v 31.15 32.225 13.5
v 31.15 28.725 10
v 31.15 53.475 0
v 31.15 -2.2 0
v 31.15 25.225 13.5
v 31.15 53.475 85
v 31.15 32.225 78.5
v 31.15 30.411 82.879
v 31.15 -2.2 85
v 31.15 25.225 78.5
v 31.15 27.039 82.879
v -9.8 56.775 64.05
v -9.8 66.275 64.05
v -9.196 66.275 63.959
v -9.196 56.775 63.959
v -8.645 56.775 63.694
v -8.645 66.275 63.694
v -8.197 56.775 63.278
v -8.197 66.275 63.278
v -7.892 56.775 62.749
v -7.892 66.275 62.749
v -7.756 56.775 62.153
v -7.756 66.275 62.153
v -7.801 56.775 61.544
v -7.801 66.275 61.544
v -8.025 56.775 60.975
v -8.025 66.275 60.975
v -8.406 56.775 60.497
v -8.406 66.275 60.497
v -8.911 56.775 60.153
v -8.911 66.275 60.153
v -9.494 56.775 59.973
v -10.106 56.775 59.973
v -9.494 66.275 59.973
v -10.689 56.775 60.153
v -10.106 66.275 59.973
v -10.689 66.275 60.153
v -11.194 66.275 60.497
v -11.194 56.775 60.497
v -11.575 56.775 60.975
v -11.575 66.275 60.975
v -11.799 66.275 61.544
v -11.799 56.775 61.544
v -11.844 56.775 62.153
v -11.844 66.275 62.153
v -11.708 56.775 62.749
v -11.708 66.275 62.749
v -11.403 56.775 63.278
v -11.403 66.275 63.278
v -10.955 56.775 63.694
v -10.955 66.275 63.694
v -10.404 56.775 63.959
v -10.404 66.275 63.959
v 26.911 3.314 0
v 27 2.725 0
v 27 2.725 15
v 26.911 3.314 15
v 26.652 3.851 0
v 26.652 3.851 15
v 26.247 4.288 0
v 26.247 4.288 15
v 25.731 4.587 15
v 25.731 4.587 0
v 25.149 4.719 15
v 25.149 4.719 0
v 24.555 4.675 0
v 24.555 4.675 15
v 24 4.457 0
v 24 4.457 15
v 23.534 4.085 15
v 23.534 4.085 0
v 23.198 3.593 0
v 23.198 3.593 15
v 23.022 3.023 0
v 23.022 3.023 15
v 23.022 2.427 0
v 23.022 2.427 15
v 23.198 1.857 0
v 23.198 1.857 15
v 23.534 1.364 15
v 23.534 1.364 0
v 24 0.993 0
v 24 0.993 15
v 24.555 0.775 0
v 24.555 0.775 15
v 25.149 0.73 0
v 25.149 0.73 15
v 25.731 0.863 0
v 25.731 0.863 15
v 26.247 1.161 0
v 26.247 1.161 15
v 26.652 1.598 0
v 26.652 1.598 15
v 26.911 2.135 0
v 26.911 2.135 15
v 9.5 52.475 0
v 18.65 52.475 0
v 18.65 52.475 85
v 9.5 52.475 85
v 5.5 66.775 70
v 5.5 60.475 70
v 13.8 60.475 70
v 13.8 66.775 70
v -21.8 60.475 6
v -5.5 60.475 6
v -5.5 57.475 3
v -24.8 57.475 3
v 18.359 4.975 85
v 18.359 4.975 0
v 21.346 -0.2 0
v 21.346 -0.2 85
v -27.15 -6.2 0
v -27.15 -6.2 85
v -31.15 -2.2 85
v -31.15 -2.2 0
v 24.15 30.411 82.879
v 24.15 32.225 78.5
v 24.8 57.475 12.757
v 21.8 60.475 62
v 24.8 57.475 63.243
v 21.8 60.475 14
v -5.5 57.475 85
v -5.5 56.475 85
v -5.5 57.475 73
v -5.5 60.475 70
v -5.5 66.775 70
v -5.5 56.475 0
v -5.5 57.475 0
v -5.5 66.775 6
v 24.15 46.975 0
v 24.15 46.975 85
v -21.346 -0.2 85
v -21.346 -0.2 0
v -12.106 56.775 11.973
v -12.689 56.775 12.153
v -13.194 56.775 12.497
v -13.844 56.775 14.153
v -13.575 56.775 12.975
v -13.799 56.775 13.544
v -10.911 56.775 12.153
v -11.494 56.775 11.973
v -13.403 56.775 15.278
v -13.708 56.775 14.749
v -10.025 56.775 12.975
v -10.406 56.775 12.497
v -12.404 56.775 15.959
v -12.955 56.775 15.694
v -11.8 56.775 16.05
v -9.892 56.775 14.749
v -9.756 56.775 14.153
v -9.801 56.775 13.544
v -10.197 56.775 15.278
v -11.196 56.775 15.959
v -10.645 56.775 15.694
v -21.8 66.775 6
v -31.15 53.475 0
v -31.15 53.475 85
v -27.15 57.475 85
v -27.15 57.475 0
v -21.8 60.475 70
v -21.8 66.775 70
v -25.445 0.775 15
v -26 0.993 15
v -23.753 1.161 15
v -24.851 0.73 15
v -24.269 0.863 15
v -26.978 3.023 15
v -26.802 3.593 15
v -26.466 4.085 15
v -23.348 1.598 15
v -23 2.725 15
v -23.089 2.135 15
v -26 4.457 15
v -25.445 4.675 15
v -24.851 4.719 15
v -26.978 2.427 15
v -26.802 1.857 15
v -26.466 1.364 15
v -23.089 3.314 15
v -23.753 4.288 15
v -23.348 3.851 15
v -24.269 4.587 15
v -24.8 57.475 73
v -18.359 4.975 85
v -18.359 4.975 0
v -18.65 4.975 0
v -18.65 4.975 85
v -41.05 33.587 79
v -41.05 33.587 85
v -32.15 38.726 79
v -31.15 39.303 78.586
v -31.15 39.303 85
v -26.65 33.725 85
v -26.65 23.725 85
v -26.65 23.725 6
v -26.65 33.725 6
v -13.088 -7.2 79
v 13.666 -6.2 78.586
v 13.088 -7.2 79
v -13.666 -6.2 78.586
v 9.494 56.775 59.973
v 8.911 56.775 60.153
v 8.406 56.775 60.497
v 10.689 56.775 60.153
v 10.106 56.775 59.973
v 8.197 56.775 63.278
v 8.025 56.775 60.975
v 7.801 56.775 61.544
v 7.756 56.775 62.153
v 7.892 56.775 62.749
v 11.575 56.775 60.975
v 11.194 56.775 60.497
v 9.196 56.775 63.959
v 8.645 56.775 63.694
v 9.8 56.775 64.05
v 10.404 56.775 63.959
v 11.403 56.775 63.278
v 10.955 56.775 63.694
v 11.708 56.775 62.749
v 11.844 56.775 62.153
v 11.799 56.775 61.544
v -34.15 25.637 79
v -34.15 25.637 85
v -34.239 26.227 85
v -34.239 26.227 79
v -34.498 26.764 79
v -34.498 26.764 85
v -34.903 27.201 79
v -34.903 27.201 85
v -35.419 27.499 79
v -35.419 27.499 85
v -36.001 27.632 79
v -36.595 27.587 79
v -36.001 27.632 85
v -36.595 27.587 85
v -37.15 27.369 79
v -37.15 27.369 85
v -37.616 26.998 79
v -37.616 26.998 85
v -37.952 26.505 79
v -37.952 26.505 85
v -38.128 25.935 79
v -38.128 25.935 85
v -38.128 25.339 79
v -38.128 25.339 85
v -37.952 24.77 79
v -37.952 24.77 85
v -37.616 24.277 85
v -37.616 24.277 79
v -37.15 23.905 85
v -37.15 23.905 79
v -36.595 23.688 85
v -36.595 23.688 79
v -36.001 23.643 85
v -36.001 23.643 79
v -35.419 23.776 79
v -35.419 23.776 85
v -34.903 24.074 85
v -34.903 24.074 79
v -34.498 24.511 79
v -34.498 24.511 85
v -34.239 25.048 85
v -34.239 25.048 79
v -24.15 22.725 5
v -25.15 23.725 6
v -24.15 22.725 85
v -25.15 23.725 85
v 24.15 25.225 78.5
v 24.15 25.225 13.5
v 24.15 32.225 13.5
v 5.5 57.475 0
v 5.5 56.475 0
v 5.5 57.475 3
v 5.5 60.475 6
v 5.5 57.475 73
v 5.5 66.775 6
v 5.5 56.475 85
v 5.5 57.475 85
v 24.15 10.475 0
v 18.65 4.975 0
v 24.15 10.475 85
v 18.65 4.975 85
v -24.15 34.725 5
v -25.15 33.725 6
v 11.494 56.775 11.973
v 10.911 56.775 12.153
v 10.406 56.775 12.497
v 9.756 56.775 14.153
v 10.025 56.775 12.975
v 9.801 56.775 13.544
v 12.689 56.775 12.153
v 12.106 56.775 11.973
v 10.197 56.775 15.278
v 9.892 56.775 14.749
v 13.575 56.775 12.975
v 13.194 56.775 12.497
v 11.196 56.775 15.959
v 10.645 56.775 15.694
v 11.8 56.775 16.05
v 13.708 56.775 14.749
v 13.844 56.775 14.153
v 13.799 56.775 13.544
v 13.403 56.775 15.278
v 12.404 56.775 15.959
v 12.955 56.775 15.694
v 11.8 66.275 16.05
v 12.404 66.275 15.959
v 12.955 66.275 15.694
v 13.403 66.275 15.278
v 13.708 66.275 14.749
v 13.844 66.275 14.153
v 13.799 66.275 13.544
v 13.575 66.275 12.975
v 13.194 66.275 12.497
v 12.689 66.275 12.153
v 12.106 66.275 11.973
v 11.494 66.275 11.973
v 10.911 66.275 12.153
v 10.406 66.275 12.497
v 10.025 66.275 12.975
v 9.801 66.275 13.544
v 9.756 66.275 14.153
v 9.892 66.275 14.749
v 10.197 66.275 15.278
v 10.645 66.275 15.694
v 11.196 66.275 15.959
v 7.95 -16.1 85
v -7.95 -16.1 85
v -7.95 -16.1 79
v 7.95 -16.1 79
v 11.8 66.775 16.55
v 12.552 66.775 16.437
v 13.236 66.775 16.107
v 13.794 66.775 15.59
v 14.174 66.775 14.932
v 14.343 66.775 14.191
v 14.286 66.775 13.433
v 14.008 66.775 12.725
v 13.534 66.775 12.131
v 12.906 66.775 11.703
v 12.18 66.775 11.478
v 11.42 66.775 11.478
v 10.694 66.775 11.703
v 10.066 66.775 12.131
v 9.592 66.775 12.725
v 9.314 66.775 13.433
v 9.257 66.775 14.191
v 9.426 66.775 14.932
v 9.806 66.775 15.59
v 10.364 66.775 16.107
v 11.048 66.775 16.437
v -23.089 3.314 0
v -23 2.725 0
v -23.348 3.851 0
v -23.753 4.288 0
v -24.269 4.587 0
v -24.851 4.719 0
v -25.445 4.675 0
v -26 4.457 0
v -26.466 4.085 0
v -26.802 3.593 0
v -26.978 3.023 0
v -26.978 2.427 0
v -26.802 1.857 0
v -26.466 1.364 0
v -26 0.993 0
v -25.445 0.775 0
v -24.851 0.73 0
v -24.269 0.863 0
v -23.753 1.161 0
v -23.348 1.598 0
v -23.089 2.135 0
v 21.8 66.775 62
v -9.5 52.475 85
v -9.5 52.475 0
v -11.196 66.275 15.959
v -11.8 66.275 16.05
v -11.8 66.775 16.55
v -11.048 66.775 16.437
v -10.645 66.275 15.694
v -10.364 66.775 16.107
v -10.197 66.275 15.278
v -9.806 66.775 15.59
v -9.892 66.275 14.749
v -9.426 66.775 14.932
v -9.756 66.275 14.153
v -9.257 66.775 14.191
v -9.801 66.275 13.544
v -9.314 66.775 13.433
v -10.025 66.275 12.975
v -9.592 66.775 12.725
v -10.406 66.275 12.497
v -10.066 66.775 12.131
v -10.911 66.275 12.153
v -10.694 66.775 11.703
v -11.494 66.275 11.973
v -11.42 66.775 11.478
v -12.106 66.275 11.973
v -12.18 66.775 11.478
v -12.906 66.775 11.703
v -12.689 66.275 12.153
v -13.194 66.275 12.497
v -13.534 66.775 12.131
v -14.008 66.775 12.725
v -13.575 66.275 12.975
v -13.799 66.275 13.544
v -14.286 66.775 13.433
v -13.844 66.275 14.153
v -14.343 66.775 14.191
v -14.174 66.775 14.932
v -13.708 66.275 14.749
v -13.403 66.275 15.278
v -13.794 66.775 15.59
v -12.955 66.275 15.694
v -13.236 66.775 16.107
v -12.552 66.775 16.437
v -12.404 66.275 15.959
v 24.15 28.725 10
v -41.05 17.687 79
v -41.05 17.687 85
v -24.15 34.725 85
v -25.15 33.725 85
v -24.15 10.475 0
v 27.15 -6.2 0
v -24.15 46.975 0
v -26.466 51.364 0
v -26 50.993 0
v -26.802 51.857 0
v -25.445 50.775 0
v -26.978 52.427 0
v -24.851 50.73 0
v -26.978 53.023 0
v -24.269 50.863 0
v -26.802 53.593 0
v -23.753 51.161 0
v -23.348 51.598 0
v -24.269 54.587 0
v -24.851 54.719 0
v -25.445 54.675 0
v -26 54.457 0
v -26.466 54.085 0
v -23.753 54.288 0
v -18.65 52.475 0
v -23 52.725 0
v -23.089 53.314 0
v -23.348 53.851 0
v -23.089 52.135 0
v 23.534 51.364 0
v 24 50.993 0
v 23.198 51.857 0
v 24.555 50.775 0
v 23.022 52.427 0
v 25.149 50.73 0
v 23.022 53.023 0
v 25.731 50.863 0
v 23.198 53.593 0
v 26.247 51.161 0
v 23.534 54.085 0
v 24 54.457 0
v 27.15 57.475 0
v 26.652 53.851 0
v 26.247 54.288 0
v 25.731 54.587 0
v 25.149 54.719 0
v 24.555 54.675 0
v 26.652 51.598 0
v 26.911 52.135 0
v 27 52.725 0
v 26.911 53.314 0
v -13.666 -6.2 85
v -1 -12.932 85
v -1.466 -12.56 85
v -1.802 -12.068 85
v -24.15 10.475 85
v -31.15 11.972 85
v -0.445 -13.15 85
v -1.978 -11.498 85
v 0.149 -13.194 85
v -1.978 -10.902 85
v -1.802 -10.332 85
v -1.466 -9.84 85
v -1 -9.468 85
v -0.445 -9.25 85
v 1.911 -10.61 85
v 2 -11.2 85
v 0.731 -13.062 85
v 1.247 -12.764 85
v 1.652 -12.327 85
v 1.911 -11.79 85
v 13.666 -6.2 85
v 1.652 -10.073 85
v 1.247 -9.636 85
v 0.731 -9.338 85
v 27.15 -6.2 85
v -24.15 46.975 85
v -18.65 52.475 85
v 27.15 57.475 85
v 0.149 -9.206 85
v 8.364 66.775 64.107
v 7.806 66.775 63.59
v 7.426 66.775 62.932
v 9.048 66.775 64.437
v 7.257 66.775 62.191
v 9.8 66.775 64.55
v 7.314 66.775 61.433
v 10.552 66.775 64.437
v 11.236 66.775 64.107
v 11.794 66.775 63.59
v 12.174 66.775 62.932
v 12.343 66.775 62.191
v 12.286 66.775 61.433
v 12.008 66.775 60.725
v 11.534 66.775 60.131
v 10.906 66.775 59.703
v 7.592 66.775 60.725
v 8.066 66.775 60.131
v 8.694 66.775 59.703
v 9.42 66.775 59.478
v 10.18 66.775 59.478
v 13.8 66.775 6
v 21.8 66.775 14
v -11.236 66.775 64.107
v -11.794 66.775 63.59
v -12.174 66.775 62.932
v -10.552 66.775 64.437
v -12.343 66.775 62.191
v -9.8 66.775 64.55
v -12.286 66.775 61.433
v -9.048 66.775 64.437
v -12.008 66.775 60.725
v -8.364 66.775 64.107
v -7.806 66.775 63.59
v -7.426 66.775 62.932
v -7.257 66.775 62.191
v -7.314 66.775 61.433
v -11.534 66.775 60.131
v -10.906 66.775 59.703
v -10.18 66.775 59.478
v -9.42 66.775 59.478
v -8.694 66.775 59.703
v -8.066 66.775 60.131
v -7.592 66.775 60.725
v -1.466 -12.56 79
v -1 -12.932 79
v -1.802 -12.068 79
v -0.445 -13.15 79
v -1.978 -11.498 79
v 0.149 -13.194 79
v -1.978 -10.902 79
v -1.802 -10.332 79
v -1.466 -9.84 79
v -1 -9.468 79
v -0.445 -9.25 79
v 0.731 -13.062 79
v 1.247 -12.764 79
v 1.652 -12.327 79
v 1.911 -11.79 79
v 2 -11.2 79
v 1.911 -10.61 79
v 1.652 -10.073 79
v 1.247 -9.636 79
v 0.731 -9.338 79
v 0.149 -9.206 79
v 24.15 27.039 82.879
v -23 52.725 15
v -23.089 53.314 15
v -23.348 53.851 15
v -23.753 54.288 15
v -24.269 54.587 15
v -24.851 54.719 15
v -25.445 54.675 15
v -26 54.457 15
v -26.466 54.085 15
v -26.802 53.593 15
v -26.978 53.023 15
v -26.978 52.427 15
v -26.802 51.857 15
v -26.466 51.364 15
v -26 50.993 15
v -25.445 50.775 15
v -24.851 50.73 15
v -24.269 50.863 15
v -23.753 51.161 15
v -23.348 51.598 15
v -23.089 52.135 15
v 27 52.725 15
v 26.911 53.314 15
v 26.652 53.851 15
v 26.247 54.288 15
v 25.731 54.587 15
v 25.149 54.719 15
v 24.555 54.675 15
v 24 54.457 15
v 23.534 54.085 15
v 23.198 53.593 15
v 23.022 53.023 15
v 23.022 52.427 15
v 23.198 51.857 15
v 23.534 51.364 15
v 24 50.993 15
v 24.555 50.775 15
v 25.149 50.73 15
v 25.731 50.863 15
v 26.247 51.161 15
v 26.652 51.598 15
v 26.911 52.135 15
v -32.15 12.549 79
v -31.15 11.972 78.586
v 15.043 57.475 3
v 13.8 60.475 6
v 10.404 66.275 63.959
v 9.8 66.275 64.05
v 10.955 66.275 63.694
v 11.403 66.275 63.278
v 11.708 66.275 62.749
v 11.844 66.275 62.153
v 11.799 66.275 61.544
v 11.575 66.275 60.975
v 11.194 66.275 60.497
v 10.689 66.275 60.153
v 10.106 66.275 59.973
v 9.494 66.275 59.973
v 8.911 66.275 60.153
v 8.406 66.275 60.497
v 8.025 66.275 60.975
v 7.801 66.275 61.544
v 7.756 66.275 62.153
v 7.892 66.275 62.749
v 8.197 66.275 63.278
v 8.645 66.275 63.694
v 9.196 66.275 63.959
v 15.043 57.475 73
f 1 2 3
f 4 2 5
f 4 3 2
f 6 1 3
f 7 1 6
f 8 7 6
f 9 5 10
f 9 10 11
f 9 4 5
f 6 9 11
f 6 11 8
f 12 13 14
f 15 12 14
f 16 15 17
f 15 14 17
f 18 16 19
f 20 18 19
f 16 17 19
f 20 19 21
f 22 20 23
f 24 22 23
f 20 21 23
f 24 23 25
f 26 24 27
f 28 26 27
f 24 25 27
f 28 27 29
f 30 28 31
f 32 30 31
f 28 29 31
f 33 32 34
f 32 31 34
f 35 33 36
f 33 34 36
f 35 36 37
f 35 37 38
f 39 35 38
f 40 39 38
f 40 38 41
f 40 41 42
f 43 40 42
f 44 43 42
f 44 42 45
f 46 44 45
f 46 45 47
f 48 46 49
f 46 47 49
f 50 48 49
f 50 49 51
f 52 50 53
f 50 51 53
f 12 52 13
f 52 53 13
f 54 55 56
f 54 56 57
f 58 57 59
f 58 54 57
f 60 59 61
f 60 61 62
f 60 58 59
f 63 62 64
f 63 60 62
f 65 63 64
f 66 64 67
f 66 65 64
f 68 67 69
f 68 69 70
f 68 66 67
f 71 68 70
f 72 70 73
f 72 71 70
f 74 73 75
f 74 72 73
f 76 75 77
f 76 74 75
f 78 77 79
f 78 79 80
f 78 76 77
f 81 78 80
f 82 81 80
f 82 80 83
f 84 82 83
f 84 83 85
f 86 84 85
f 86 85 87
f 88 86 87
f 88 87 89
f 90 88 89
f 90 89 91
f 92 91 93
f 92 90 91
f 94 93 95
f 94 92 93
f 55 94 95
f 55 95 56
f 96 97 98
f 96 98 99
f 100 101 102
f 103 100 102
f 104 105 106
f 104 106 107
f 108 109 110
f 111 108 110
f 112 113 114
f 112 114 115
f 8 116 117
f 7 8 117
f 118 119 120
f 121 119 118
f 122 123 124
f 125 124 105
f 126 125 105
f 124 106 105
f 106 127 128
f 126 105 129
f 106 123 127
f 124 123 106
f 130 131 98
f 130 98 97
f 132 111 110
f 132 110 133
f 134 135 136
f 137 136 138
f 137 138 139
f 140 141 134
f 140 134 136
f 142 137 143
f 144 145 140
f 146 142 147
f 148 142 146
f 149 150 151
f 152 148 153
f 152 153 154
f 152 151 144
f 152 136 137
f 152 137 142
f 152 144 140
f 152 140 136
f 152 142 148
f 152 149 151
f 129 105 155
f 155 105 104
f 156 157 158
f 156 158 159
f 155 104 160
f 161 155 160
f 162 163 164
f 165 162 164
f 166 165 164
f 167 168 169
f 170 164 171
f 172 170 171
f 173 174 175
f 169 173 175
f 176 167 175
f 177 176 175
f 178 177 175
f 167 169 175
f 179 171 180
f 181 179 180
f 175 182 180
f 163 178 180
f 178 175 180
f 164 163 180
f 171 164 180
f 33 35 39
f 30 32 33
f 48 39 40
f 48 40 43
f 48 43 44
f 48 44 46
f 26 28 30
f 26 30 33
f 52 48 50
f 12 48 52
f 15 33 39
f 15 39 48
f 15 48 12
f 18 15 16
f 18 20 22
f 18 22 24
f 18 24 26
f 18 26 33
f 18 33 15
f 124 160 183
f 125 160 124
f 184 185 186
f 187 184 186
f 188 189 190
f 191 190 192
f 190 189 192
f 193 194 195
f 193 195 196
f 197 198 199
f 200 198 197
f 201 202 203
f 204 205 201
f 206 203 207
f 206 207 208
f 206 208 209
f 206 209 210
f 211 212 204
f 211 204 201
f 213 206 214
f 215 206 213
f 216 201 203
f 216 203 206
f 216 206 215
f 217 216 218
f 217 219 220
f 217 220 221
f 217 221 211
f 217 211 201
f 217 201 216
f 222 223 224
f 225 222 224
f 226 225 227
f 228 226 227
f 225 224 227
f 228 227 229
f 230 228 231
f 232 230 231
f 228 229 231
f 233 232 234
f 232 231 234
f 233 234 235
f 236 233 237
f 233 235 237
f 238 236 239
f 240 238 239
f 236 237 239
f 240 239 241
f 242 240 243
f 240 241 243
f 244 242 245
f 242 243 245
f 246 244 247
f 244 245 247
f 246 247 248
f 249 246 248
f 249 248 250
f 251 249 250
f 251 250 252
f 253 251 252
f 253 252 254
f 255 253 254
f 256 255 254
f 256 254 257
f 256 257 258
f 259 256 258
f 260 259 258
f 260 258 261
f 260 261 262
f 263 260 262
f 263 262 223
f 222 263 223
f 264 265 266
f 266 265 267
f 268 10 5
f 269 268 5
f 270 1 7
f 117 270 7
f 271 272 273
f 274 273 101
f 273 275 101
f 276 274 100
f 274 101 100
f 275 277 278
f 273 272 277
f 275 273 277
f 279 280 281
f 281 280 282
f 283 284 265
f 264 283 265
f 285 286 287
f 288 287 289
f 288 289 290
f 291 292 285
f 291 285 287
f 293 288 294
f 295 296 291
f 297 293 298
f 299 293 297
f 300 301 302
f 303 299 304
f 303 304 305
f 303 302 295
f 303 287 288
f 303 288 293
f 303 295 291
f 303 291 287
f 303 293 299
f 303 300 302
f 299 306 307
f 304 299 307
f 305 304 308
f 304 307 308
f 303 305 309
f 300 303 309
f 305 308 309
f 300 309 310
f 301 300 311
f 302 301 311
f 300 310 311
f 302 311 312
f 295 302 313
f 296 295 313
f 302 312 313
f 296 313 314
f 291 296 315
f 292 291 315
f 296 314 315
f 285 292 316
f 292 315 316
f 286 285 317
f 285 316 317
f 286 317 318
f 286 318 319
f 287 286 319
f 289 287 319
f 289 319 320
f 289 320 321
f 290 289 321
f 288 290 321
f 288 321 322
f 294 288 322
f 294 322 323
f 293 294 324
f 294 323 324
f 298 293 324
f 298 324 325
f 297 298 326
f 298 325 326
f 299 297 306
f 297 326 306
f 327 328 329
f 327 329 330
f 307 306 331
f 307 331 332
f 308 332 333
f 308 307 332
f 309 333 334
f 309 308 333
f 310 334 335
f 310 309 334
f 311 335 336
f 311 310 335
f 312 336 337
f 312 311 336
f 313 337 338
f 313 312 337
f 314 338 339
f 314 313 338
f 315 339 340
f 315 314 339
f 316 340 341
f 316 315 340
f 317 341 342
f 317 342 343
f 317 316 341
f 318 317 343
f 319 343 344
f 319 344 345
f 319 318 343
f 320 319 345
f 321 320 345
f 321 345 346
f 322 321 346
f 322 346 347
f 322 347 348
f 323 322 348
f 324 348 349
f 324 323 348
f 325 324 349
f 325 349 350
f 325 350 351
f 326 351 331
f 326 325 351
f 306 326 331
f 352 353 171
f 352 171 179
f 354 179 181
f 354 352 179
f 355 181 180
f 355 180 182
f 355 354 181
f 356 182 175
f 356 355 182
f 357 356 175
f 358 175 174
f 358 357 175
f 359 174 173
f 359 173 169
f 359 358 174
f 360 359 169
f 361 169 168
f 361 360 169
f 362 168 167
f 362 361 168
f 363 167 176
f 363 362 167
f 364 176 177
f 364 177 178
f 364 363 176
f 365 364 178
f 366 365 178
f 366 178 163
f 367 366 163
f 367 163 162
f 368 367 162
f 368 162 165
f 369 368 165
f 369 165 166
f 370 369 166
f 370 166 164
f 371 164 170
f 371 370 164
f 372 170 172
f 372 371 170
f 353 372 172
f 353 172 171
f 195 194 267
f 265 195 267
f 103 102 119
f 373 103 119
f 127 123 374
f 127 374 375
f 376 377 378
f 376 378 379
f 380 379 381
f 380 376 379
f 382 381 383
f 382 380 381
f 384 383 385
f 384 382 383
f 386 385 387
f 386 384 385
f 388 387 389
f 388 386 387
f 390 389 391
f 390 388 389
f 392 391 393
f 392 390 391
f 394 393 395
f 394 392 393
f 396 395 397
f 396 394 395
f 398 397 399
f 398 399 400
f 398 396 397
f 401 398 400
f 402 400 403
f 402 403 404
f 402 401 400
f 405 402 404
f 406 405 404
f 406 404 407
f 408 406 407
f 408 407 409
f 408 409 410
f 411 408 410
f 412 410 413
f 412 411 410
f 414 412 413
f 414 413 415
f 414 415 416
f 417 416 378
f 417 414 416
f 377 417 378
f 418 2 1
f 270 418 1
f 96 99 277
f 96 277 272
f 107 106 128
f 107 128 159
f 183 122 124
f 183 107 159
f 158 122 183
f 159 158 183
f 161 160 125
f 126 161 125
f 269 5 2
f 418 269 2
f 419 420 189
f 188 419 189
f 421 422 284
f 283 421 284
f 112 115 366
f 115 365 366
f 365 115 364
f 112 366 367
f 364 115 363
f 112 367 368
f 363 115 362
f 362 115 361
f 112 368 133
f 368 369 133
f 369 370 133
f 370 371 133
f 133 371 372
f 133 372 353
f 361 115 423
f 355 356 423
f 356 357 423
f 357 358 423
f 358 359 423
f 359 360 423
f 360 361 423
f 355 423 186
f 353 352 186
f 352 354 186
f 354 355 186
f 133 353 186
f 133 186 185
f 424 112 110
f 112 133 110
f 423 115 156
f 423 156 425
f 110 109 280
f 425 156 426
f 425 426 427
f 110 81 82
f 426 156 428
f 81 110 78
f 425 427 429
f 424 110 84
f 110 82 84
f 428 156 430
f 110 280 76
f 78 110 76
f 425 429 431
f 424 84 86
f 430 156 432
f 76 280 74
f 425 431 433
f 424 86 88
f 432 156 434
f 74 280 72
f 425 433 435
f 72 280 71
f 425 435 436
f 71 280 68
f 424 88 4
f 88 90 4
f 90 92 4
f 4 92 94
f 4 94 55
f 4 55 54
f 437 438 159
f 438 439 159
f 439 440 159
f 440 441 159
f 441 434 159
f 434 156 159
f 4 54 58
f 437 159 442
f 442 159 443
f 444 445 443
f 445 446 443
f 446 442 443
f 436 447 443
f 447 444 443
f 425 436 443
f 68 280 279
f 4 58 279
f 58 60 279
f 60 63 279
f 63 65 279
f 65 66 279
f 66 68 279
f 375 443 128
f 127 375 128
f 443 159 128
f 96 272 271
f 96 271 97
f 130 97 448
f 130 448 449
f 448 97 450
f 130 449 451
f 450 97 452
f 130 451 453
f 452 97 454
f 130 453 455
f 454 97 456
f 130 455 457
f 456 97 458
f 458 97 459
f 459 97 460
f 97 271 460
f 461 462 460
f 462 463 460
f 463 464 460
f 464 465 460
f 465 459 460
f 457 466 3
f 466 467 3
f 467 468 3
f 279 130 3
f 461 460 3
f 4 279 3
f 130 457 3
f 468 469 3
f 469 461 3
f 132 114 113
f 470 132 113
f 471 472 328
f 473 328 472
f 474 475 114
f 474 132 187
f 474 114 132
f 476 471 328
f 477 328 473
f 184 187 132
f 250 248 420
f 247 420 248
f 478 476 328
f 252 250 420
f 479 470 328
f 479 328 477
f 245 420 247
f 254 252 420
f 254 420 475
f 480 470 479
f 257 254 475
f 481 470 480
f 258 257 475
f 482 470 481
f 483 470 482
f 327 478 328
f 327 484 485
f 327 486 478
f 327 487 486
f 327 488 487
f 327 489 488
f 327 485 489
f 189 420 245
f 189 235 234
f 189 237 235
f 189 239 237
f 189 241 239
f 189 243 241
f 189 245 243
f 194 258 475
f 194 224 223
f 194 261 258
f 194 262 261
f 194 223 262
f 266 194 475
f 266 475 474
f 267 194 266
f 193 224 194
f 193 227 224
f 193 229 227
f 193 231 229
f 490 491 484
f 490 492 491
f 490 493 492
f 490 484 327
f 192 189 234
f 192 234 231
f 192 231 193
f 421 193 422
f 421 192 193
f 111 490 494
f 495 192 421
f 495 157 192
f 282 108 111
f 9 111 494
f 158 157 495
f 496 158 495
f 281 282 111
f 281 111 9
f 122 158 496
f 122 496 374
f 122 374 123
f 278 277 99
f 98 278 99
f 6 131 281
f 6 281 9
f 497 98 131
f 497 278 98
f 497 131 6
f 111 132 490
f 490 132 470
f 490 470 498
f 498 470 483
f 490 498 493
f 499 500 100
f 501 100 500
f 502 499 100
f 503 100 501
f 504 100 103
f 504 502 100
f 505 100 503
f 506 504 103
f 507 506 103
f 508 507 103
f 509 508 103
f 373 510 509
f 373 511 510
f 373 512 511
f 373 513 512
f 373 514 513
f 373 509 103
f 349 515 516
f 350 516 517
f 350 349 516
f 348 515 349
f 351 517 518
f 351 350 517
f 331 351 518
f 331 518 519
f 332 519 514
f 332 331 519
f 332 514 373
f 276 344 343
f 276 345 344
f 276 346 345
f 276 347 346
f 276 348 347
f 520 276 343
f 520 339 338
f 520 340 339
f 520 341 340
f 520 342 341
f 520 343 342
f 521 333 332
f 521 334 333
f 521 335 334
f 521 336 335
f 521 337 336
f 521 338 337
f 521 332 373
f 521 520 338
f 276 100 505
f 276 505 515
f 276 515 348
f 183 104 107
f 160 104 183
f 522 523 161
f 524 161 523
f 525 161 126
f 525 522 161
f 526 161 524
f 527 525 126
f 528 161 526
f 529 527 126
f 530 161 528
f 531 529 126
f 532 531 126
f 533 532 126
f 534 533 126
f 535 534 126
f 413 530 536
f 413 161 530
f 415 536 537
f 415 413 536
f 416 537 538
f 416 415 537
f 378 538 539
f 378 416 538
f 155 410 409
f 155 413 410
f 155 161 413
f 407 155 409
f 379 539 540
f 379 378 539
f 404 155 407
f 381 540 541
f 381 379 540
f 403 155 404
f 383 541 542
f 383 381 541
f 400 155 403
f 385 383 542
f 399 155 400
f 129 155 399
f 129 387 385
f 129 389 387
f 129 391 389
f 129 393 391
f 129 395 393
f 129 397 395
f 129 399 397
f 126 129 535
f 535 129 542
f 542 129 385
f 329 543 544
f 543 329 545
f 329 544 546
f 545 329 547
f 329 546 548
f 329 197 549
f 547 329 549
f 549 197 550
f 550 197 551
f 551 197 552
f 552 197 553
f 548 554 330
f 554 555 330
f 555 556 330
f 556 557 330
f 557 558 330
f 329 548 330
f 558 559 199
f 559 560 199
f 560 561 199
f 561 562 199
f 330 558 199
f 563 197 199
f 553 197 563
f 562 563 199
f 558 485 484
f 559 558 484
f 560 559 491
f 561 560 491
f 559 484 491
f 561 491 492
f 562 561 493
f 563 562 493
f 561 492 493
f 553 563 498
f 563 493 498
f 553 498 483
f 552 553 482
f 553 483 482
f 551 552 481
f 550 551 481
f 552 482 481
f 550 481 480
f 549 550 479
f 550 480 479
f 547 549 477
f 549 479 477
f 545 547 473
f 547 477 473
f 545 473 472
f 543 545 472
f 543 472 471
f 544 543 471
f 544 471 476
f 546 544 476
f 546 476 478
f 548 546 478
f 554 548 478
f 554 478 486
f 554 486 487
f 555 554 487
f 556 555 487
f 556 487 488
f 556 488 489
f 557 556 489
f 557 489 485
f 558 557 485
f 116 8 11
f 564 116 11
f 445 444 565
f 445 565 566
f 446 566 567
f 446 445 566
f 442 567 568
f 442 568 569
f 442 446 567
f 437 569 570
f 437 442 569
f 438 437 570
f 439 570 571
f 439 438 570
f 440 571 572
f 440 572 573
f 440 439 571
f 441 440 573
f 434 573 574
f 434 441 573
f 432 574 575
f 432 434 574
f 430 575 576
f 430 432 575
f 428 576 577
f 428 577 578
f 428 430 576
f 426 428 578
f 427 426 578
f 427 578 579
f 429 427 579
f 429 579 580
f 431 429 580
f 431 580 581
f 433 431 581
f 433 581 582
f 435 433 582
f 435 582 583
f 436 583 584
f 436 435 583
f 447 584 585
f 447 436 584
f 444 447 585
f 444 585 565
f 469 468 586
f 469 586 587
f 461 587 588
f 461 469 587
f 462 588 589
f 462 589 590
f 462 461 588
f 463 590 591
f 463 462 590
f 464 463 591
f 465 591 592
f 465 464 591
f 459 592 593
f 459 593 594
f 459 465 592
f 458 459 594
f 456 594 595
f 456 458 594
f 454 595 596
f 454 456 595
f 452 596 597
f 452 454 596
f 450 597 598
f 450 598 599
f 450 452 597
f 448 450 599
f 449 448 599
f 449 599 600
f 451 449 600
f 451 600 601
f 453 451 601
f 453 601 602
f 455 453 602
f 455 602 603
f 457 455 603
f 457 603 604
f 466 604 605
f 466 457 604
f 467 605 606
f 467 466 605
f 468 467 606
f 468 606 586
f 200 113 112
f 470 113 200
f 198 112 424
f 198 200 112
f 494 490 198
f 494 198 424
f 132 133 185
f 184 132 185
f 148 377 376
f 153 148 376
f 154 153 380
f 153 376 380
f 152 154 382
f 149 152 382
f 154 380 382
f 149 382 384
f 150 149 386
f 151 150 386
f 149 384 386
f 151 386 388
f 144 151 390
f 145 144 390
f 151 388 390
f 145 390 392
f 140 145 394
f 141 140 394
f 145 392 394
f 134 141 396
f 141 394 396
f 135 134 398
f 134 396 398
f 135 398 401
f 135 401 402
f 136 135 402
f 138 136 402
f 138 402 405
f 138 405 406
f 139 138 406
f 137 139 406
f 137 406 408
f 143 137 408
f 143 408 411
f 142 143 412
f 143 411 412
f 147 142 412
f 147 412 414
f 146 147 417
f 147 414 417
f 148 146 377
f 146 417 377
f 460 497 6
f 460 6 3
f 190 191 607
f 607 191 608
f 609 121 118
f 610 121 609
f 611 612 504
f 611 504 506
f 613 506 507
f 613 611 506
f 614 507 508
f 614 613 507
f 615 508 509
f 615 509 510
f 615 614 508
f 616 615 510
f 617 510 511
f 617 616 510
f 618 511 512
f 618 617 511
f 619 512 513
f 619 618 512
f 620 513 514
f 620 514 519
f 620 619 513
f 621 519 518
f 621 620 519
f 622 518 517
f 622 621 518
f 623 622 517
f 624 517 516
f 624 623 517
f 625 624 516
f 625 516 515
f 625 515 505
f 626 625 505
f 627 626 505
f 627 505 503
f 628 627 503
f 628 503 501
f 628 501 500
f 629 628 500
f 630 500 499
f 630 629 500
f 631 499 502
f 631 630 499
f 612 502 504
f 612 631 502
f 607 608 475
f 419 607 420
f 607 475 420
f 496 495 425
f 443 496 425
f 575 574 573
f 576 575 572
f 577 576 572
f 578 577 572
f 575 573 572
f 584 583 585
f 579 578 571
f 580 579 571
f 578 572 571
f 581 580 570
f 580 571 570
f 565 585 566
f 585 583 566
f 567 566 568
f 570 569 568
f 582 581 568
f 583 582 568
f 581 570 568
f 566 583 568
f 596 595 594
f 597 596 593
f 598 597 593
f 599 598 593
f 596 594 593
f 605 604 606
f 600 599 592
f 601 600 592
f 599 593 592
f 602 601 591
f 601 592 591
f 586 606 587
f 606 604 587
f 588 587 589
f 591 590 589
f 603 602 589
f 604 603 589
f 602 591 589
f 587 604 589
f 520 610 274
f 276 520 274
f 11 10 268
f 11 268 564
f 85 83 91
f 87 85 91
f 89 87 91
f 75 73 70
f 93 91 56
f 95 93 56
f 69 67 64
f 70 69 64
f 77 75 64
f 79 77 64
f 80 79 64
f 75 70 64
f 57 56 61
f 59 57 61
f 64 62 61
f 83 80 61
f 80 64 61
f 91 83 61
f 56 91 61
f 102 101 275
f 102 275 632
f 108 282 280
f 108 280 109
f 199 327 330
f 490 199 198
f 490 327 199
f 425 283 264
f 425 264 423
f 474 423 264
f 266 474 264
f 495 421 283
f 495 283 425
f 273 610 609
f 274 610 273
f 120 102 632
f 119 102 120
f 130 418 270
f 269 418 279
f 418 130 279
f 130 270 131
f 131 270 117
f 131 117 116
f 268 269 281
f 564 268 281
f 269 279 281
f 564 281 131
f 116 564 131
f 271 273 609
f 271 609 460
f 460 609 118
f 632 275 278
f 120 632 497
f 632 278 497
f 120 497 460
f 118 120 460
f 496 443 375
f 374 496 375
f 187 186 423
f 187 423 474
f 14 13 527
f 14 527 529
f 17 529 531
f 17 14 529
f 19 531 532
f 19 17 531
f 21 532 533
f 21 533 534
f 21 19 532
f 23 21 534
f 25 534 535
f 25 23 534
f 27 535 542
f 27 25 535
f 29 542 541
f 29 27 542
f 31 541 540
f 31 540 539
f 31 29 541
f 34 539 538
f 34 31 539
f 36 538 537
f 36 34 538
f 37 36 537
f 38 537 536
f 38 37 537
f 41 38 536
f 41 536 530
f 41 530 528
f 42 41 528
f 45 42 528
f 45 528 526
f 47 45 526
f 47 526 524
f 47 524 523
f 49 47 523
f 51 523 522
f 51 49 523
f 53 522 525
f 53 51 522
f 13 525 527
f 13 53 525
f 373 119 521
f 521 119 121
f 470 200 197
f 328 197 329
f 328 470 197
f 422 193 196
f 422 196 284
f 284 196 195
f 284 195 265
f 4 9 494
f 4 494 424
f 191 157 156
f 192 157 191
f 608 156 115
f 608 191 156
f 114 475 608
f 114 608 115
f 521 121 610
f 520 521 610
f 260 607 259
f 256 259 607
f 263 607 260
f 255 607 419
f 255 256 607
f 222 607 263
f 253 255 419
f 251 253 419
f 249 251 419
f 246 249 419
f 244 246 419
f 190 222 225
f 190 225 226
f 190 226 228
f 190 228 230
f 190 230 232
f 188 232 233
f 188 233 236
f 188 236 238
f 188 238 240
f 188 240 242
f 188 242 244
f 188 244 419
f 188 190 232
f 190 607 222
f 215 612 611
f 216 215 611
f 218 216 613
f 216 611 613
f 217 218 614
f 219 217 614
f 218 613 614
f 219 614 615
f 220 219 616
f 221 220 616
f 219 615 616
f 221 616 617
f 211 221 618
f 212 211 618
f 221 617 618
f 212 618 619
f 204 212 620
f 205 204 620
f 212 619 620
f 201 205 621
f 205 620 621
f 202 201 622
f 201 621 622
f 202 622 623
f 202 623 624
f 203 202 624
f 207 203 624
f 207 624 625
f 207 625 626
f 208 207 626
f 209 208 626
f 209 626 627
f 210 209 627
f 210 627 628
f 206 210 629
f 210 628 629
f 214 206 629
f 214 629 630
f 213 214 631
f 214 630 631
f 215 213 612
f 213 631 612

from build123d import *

# Parameters (mm, degrees)
BOSS_EXTRUDE1_DEPTH     = 100
BOSS_EXTRUDE2_DEPTH     = 100
CUT_EXTRUDE1_DEPTH      = 10
CHAMFER1_SIZE           = 5.5
CHAMFER2_SIZE           = 4
SKETCH8_R               = 2
BOSS_EXTRUDE3_DEPTH     = 9.3
CUT_EXTRUDE3_DEPTH      = 125.214315536
CUT_EXTRUDE3_DEPTH_BACK = 10
SKETCH9_W               = 11
SKETCH9_H               = 9.3
CHAMFER3_SIZE           = 4
CHAMFER4_SIZE           = 3
CHAMFER5_SIZE           = 3
SKETCH10_W              = 5
SKETCH10_H              = 10
CUT_EXTRUDE4_DEPTH      = 94
CHAMFER7_SIZE           = 1
CHAMFER8_SIZE           = 1
SKETCH11_R              = 2.05
CUT_EXTRUDE5_DEPTH      = 10
CHAMFER9_SIZE           = 0.5
SKETCH12_R              = 2
CUT_EXTRUDE6_DEPTH      = 15
SKETCH20_W              = 62.3
SKETCH20_H              = 63.674798271
CUT_EXTRUDE14_DEPTH     = 15
BOSS_EXTRUDE4_DEPTH     = 6
SKETCH22_R              = 2
CUT_EXTRUDE15_DEPTH     = 10
CHAMFER10_SIZE          = 1
CHAMFER10_SIZE2         = 0.414213562
CHAMFER11_SIZE          = 1
CHAMFER11_SIZE2         = 0.414213562


with BuildPart() as part:
    # Sketch4 → Boss-Extrude1 (new body)
    with BuildSketch(Plane.XY):
        Polygon((-18.358738987, 4.974798271), (-27, 4.974798271), (-27, -6.2), (27, -6.2), (27, 4.974798271), (18.358738987, 4.974798271), (21.346410162, -0.2), (-21.346410162, -0.2), align=None)
    extrude(amount=BOSS_EXTRUDE1_DEPTH)

    # Sketch6 → Boss-Extrude2 (add)
    with BuildSketch(Plane.XY.offset(100)):
        Polygon((-24.15, 4.974798271), (-24.15, 52.474798271), (-5.5, 52.474798271), (-5.5, 57.474798271), (-31.15, 57.474798271), (-31.15, -6.2), (-24.15, -6.2), align=None)
        Polygon((24.15, -6.2), (24.15, 52.474798271), (5.5, 52.474798271), (5.5, 57.474798271), (31.15, 57.474798271), (31.15, -6.2), align=None)
    extrude(amount=-BOSS_EXTRUDE2_DEPTH)

    # Sketch7 → Cut-Extrude1 (cut)
    with BuildSketch(Plane(origin=(31.15, 0, 0), x_dir=(0, 0, -1), z_dir=(1, 0, 0))):
        Polygon((-85, 28.724798271), (-81.5, 25.224798271), (-13.5, 25.224798271), (-10, 28.724798271), (-13.5, 32.224798271), (-81.5, 32.224798271), align=None)
    extrude(amount=-CUT_EXTRUDE1_DEPTH, mode=Mode.SUBTRACT)

    # Chamfer1
    chamfer1_edges = [part.edges().sort_by_distance(p)[0] for p in [
        (-24.15, 52.474798271, 50),
        (-24.15, 4.974798271, 50),
        (24.15, 4.974798271, 50),
        (24.15, 52.474798271, 50),
    ]]
    chamfer(chamfer1_edges, length=CHAMFER1_SIZE)

    # Chamfer2
    chamfer2_edges = [part.edges().sort_by_distance(p)[0] for p in [
        (-5.5, 52.474798271, 50),
        (5.5, 52.474798271, 50),
    ]]
    chamfer(chamfer2_edges, length=CHAMFER2_SIZE)

    # Sketch8 → Boss-Extrude3 (add)
    with BuildSketch(Plane(origin=(0, 57.474798271, 0), x_dir=(1, 0, 0), z_dir=(0, 1, 0))):
        Polygon((-21.8, -70), (13.8, -70), (21.8, -62), (21.8, -14), (13.8, -6), (-21.8, -6), align=None)
        with Locations(Location((9.8, -62, 0), (0, 0, 270))):
            Circle(SKETCH8_R, mode=Mode.SUBTRACT)
        with Locations(Location((11.8, -14, 0), (0, 0, 270))):
            Circle(SKETCH8_R, mode=Mode.SUBTRACT)
        with Locations(Location((-11.8, -14, 0), (0, 0, 270))):
            Circle(SKETCH8_R, mode=Mode.SUBTRACT)
        with Locations(Location((-9.8, -62, 0), (0, 0, 270))):
            Circle(SKETCH8_R, mode=Mode.SUBTRACT)
    extrude(amount=BOSS_EXTRUDE3_DEPTH)

    # Sketch9 → Cut-Extrude3 (cut, two sides: drawn at the far end of the back side and taken through both)
    with BuildSketch(Plane.XY.offset(-CUT_EXTRUDE3_DEPTH_BACK)):
        with Locations((0, 62.124798271)):
            Rectangle(SKETCH9_W, SKETCH9_H)
    extrude(amount=CUT_EXTRUDE3_DEPTH + CUT_EXTRUDE3_DEPTH_BACK, mode=Mode.SUBTRACT)

    # Chamfer3
    chamfer3_edges = [part.edges().sort_by_distance(p)[0] for p in [
        (-31.15, -6.2, 50),
        (-31.15, 57.474798271, 50),
        (31.15, -6.2, 50),
        (31.15, 57.474798271, 50),
    ]]
    chamfer(chamfer3_edges, length=CHAMFER3_SIZE)

    # Chamfer4
    chamfer4_edges = [part.edges().sort_by_distance(p)[0] for p in [
        (9.65, 57.474798271, 70),
        (-21.8, 57.474798271, 38),
        (-13.65, 57.474798271, 70),
        (17.8, 57.474798271, 66),
        (21.8, 57.474798271, 38),
        (17.8, 57.474798271, 10),
        (9.65, 57.474798271, 6),
        (-13.65, 57.474798271, 6),
    ]]
    chamfer(chamfer4_edges, length=CHAMFER4_SIZE)

    # Chamfer5
    # the kernel refuses this chamfer: 3 mm, written as the material it adds along each edge
    with BuildSketch(Plane(origin=(31.15, 25.224798271, 81.5), x_dir=(0, -0.014760203742521738, -0.9998910622590239), z_dir=(-1, 0, 0)), Plane(origin=(31.15, 32.224798271, 81.5), x_dir=(0, -0.6965927104131427, 0.7174667907292097), z_dir=(-1, 0, 0))) as chamfer5_piece_1:
        Polygon((CHAMFER5_SIZE * 0.999891062259, -CHAMFER5_SIZE * 0.0147602037425), (-CHAMFER5_SIZE * 0.717466790729, -CHAMFER5_SIZE * 0.696592710413), (0, 0), align=None)
    extrude(amount=7)
    with BuildSketch(Plane(origin=(31.15, 28.724798271, 85), x_dir=(0, 0.7262819568766863, -0.687396915264661), z_dir=(-1, 0, 0))) as chamfer5_piece_2:
        Polygon((CHAMFER5_SIZE * 0.999621916911, CHAMFER5_SIZE * 0.0274958766106), (-CHAMFER5_SIZE * 0.0274958766106, CHAMFER5_SIZE * 0.999621916911), (0, 0), align=None)
    extrude(amount=7)

    # Sketch10 → Cut-Extrude4 (cut)
    with BuildSketch(Plane.XY.offset(100)):
        with Locations((-24.15, 28.724798271)):
            Rectangle(SKETCH10_W, SKETCH10_H)
    extrude(amount=-CUT_EXTRUDE4_DEPTH, mode=Mode.SUBTRACT)

    # Chamfer7
    chamfer7_edges = [part.edges().sort_by_distance(p)[0] for p in [
        (-24.15, 28.724798271, 6),
    ]]
    chamfer(chamfer7_edges, length=CHAMFER7_SIZE)

    # Chamfer8
    chamfer8_edges = [part.edges().sort_by_distance(p)[0] for p in [
        (-24.15, 23.724798271, 52.5),
        (-24.15, 33.724798271, 52.5),
    ]]
    chamfer(chamfer8_edges, length=CHAMFER8_SIZE)

    # Sketch11 → Cut-Extrude5 (cut)
    with BuildSketch(Plane(origin=(0, 66.774798271, 0), x_dir=(1, 0, 0), z_dir=(0, 1, 0))):
        with Locations(Location((-11.8, -14, 0), (0, 0, 270))):
            Circle(SKETCH11_R)
        with Locations(Location((11.8, -14, 0), (0, 0, 270))):
            Circle(SKETCH11_R)
        with Locations(Location((-9.8, -62, 0), (0, 0, 270))):
            Circle(SKETCH11_R)
        with Locations(Location((9.8, -62, 0), (0, 0, 270))):
            Circle(SKETCH11_R)
    extrude(amount=-CUT_EXTRUDE5_DEPTH, mode=Mode.SUBTRACT)

    # Chamfer9
    chamfer9_edges = [part.edges().sort_by_distance(p)[0] for p in [
        (11.8, 66.774798271, 11.95),
        (-9.8, 66.774798271, 59.95),
        (9.8, 66.774798271, 59.95),
        (-11.8, 66.774798271, 11.95),
    ]]
    chamfer(chamfer9_edges, length=CHAMFER9_SIZE)

    # Sketch12 → Cut-Extrude6 (cut)
    with BuildSketch(Plane.XY):
        with Locations((-25, 52.724798271)):
            Circle(SKETCH12_R)
        with Locations((25, 52.724798271)):
            Circle(SKETCH12_R)
        with Locations((-25, 2.724798271)):
            Circle(SKETCH12_R)
        with Locations((25, 2.724798271)):
            Circle(SKETCH12_R)
    extrude(amount=CUT_EXTRUDE6_DEPTH, mode=Mode.SUBTRACT)

    # Sketch20 → Cut-Extrude14 (cut)
    with BuildSketch(Plane.XY.offset(100)):
        with Locations((0, 25.637399136)):
            Rectangle(SKETCH20_W, SKETCH20_H)
    extrude(amount=-CUT_EXTRUDE14_DEPTH, mode=Mode.SUBTRACT)

    # Sketch21 → Boss-Extrude4 (add)
    with BuildSketch(Plane.XY.offset(85)):
        Polygon((-31.15, 11.971631471), (-41.05, 17.687399136), (-41.05, 33.587399136), (-31.15, 39.303166801), align=None)
        Polygon((-13.665767665, -6.2), (-7.95, -16.1), (7.95, -16.1), (13.665767665, -6.2), align=None)
    extrude(amount=-BOSS_EXTRUDE4_DEPTH)

    # Sketch22 → Cut-Extrude15 (cut)
    with BuildSketch(Plane.XY.offset(85)):
        with Locations((-36.15, 25.637399136)):
            Circle(SKETCH22_R)
        with Locations((0, -11.2)):
            Circle(SKETCH22_R)
    extrude(amount=-CUT_EXTRUDE15_DEPTH, mode=Mode.SUBTRACT)

    # Chamfer10
    chamfer10_edges = [part.edges().sort_by_distance(p)[0] for p in [
        (0, -6.2, 79),
    ]]
    chamfer10_side = [part.faces().sort_by_distance(p)[0] for p in [
        (-10.556136515, -11.004653619, 79),
    ]]
    chamfer(chamfer10_edges, length=CHAMFER10_SIZE, length2=CHAMFER10_SIZE2, reference=chamfer10_side[0])

    # Chamfer11
    chamfer11_edges = [part.edges().sort_by_distance(p)[0] for p in [
        (-31.15, 25.637399136, 79),
    ]]
    chamfer11_side = [part.faces().sort_by_distance(p)[0] for p in [
        (-35.954653619, 15.08126262, 79),
    ]]
    chamfer(chamfer11_edges, length=CHAMFER11_SIZE, length2=CHAMFER11_SIZE2, reference=chamfer11_side[0])


solid = part.part
